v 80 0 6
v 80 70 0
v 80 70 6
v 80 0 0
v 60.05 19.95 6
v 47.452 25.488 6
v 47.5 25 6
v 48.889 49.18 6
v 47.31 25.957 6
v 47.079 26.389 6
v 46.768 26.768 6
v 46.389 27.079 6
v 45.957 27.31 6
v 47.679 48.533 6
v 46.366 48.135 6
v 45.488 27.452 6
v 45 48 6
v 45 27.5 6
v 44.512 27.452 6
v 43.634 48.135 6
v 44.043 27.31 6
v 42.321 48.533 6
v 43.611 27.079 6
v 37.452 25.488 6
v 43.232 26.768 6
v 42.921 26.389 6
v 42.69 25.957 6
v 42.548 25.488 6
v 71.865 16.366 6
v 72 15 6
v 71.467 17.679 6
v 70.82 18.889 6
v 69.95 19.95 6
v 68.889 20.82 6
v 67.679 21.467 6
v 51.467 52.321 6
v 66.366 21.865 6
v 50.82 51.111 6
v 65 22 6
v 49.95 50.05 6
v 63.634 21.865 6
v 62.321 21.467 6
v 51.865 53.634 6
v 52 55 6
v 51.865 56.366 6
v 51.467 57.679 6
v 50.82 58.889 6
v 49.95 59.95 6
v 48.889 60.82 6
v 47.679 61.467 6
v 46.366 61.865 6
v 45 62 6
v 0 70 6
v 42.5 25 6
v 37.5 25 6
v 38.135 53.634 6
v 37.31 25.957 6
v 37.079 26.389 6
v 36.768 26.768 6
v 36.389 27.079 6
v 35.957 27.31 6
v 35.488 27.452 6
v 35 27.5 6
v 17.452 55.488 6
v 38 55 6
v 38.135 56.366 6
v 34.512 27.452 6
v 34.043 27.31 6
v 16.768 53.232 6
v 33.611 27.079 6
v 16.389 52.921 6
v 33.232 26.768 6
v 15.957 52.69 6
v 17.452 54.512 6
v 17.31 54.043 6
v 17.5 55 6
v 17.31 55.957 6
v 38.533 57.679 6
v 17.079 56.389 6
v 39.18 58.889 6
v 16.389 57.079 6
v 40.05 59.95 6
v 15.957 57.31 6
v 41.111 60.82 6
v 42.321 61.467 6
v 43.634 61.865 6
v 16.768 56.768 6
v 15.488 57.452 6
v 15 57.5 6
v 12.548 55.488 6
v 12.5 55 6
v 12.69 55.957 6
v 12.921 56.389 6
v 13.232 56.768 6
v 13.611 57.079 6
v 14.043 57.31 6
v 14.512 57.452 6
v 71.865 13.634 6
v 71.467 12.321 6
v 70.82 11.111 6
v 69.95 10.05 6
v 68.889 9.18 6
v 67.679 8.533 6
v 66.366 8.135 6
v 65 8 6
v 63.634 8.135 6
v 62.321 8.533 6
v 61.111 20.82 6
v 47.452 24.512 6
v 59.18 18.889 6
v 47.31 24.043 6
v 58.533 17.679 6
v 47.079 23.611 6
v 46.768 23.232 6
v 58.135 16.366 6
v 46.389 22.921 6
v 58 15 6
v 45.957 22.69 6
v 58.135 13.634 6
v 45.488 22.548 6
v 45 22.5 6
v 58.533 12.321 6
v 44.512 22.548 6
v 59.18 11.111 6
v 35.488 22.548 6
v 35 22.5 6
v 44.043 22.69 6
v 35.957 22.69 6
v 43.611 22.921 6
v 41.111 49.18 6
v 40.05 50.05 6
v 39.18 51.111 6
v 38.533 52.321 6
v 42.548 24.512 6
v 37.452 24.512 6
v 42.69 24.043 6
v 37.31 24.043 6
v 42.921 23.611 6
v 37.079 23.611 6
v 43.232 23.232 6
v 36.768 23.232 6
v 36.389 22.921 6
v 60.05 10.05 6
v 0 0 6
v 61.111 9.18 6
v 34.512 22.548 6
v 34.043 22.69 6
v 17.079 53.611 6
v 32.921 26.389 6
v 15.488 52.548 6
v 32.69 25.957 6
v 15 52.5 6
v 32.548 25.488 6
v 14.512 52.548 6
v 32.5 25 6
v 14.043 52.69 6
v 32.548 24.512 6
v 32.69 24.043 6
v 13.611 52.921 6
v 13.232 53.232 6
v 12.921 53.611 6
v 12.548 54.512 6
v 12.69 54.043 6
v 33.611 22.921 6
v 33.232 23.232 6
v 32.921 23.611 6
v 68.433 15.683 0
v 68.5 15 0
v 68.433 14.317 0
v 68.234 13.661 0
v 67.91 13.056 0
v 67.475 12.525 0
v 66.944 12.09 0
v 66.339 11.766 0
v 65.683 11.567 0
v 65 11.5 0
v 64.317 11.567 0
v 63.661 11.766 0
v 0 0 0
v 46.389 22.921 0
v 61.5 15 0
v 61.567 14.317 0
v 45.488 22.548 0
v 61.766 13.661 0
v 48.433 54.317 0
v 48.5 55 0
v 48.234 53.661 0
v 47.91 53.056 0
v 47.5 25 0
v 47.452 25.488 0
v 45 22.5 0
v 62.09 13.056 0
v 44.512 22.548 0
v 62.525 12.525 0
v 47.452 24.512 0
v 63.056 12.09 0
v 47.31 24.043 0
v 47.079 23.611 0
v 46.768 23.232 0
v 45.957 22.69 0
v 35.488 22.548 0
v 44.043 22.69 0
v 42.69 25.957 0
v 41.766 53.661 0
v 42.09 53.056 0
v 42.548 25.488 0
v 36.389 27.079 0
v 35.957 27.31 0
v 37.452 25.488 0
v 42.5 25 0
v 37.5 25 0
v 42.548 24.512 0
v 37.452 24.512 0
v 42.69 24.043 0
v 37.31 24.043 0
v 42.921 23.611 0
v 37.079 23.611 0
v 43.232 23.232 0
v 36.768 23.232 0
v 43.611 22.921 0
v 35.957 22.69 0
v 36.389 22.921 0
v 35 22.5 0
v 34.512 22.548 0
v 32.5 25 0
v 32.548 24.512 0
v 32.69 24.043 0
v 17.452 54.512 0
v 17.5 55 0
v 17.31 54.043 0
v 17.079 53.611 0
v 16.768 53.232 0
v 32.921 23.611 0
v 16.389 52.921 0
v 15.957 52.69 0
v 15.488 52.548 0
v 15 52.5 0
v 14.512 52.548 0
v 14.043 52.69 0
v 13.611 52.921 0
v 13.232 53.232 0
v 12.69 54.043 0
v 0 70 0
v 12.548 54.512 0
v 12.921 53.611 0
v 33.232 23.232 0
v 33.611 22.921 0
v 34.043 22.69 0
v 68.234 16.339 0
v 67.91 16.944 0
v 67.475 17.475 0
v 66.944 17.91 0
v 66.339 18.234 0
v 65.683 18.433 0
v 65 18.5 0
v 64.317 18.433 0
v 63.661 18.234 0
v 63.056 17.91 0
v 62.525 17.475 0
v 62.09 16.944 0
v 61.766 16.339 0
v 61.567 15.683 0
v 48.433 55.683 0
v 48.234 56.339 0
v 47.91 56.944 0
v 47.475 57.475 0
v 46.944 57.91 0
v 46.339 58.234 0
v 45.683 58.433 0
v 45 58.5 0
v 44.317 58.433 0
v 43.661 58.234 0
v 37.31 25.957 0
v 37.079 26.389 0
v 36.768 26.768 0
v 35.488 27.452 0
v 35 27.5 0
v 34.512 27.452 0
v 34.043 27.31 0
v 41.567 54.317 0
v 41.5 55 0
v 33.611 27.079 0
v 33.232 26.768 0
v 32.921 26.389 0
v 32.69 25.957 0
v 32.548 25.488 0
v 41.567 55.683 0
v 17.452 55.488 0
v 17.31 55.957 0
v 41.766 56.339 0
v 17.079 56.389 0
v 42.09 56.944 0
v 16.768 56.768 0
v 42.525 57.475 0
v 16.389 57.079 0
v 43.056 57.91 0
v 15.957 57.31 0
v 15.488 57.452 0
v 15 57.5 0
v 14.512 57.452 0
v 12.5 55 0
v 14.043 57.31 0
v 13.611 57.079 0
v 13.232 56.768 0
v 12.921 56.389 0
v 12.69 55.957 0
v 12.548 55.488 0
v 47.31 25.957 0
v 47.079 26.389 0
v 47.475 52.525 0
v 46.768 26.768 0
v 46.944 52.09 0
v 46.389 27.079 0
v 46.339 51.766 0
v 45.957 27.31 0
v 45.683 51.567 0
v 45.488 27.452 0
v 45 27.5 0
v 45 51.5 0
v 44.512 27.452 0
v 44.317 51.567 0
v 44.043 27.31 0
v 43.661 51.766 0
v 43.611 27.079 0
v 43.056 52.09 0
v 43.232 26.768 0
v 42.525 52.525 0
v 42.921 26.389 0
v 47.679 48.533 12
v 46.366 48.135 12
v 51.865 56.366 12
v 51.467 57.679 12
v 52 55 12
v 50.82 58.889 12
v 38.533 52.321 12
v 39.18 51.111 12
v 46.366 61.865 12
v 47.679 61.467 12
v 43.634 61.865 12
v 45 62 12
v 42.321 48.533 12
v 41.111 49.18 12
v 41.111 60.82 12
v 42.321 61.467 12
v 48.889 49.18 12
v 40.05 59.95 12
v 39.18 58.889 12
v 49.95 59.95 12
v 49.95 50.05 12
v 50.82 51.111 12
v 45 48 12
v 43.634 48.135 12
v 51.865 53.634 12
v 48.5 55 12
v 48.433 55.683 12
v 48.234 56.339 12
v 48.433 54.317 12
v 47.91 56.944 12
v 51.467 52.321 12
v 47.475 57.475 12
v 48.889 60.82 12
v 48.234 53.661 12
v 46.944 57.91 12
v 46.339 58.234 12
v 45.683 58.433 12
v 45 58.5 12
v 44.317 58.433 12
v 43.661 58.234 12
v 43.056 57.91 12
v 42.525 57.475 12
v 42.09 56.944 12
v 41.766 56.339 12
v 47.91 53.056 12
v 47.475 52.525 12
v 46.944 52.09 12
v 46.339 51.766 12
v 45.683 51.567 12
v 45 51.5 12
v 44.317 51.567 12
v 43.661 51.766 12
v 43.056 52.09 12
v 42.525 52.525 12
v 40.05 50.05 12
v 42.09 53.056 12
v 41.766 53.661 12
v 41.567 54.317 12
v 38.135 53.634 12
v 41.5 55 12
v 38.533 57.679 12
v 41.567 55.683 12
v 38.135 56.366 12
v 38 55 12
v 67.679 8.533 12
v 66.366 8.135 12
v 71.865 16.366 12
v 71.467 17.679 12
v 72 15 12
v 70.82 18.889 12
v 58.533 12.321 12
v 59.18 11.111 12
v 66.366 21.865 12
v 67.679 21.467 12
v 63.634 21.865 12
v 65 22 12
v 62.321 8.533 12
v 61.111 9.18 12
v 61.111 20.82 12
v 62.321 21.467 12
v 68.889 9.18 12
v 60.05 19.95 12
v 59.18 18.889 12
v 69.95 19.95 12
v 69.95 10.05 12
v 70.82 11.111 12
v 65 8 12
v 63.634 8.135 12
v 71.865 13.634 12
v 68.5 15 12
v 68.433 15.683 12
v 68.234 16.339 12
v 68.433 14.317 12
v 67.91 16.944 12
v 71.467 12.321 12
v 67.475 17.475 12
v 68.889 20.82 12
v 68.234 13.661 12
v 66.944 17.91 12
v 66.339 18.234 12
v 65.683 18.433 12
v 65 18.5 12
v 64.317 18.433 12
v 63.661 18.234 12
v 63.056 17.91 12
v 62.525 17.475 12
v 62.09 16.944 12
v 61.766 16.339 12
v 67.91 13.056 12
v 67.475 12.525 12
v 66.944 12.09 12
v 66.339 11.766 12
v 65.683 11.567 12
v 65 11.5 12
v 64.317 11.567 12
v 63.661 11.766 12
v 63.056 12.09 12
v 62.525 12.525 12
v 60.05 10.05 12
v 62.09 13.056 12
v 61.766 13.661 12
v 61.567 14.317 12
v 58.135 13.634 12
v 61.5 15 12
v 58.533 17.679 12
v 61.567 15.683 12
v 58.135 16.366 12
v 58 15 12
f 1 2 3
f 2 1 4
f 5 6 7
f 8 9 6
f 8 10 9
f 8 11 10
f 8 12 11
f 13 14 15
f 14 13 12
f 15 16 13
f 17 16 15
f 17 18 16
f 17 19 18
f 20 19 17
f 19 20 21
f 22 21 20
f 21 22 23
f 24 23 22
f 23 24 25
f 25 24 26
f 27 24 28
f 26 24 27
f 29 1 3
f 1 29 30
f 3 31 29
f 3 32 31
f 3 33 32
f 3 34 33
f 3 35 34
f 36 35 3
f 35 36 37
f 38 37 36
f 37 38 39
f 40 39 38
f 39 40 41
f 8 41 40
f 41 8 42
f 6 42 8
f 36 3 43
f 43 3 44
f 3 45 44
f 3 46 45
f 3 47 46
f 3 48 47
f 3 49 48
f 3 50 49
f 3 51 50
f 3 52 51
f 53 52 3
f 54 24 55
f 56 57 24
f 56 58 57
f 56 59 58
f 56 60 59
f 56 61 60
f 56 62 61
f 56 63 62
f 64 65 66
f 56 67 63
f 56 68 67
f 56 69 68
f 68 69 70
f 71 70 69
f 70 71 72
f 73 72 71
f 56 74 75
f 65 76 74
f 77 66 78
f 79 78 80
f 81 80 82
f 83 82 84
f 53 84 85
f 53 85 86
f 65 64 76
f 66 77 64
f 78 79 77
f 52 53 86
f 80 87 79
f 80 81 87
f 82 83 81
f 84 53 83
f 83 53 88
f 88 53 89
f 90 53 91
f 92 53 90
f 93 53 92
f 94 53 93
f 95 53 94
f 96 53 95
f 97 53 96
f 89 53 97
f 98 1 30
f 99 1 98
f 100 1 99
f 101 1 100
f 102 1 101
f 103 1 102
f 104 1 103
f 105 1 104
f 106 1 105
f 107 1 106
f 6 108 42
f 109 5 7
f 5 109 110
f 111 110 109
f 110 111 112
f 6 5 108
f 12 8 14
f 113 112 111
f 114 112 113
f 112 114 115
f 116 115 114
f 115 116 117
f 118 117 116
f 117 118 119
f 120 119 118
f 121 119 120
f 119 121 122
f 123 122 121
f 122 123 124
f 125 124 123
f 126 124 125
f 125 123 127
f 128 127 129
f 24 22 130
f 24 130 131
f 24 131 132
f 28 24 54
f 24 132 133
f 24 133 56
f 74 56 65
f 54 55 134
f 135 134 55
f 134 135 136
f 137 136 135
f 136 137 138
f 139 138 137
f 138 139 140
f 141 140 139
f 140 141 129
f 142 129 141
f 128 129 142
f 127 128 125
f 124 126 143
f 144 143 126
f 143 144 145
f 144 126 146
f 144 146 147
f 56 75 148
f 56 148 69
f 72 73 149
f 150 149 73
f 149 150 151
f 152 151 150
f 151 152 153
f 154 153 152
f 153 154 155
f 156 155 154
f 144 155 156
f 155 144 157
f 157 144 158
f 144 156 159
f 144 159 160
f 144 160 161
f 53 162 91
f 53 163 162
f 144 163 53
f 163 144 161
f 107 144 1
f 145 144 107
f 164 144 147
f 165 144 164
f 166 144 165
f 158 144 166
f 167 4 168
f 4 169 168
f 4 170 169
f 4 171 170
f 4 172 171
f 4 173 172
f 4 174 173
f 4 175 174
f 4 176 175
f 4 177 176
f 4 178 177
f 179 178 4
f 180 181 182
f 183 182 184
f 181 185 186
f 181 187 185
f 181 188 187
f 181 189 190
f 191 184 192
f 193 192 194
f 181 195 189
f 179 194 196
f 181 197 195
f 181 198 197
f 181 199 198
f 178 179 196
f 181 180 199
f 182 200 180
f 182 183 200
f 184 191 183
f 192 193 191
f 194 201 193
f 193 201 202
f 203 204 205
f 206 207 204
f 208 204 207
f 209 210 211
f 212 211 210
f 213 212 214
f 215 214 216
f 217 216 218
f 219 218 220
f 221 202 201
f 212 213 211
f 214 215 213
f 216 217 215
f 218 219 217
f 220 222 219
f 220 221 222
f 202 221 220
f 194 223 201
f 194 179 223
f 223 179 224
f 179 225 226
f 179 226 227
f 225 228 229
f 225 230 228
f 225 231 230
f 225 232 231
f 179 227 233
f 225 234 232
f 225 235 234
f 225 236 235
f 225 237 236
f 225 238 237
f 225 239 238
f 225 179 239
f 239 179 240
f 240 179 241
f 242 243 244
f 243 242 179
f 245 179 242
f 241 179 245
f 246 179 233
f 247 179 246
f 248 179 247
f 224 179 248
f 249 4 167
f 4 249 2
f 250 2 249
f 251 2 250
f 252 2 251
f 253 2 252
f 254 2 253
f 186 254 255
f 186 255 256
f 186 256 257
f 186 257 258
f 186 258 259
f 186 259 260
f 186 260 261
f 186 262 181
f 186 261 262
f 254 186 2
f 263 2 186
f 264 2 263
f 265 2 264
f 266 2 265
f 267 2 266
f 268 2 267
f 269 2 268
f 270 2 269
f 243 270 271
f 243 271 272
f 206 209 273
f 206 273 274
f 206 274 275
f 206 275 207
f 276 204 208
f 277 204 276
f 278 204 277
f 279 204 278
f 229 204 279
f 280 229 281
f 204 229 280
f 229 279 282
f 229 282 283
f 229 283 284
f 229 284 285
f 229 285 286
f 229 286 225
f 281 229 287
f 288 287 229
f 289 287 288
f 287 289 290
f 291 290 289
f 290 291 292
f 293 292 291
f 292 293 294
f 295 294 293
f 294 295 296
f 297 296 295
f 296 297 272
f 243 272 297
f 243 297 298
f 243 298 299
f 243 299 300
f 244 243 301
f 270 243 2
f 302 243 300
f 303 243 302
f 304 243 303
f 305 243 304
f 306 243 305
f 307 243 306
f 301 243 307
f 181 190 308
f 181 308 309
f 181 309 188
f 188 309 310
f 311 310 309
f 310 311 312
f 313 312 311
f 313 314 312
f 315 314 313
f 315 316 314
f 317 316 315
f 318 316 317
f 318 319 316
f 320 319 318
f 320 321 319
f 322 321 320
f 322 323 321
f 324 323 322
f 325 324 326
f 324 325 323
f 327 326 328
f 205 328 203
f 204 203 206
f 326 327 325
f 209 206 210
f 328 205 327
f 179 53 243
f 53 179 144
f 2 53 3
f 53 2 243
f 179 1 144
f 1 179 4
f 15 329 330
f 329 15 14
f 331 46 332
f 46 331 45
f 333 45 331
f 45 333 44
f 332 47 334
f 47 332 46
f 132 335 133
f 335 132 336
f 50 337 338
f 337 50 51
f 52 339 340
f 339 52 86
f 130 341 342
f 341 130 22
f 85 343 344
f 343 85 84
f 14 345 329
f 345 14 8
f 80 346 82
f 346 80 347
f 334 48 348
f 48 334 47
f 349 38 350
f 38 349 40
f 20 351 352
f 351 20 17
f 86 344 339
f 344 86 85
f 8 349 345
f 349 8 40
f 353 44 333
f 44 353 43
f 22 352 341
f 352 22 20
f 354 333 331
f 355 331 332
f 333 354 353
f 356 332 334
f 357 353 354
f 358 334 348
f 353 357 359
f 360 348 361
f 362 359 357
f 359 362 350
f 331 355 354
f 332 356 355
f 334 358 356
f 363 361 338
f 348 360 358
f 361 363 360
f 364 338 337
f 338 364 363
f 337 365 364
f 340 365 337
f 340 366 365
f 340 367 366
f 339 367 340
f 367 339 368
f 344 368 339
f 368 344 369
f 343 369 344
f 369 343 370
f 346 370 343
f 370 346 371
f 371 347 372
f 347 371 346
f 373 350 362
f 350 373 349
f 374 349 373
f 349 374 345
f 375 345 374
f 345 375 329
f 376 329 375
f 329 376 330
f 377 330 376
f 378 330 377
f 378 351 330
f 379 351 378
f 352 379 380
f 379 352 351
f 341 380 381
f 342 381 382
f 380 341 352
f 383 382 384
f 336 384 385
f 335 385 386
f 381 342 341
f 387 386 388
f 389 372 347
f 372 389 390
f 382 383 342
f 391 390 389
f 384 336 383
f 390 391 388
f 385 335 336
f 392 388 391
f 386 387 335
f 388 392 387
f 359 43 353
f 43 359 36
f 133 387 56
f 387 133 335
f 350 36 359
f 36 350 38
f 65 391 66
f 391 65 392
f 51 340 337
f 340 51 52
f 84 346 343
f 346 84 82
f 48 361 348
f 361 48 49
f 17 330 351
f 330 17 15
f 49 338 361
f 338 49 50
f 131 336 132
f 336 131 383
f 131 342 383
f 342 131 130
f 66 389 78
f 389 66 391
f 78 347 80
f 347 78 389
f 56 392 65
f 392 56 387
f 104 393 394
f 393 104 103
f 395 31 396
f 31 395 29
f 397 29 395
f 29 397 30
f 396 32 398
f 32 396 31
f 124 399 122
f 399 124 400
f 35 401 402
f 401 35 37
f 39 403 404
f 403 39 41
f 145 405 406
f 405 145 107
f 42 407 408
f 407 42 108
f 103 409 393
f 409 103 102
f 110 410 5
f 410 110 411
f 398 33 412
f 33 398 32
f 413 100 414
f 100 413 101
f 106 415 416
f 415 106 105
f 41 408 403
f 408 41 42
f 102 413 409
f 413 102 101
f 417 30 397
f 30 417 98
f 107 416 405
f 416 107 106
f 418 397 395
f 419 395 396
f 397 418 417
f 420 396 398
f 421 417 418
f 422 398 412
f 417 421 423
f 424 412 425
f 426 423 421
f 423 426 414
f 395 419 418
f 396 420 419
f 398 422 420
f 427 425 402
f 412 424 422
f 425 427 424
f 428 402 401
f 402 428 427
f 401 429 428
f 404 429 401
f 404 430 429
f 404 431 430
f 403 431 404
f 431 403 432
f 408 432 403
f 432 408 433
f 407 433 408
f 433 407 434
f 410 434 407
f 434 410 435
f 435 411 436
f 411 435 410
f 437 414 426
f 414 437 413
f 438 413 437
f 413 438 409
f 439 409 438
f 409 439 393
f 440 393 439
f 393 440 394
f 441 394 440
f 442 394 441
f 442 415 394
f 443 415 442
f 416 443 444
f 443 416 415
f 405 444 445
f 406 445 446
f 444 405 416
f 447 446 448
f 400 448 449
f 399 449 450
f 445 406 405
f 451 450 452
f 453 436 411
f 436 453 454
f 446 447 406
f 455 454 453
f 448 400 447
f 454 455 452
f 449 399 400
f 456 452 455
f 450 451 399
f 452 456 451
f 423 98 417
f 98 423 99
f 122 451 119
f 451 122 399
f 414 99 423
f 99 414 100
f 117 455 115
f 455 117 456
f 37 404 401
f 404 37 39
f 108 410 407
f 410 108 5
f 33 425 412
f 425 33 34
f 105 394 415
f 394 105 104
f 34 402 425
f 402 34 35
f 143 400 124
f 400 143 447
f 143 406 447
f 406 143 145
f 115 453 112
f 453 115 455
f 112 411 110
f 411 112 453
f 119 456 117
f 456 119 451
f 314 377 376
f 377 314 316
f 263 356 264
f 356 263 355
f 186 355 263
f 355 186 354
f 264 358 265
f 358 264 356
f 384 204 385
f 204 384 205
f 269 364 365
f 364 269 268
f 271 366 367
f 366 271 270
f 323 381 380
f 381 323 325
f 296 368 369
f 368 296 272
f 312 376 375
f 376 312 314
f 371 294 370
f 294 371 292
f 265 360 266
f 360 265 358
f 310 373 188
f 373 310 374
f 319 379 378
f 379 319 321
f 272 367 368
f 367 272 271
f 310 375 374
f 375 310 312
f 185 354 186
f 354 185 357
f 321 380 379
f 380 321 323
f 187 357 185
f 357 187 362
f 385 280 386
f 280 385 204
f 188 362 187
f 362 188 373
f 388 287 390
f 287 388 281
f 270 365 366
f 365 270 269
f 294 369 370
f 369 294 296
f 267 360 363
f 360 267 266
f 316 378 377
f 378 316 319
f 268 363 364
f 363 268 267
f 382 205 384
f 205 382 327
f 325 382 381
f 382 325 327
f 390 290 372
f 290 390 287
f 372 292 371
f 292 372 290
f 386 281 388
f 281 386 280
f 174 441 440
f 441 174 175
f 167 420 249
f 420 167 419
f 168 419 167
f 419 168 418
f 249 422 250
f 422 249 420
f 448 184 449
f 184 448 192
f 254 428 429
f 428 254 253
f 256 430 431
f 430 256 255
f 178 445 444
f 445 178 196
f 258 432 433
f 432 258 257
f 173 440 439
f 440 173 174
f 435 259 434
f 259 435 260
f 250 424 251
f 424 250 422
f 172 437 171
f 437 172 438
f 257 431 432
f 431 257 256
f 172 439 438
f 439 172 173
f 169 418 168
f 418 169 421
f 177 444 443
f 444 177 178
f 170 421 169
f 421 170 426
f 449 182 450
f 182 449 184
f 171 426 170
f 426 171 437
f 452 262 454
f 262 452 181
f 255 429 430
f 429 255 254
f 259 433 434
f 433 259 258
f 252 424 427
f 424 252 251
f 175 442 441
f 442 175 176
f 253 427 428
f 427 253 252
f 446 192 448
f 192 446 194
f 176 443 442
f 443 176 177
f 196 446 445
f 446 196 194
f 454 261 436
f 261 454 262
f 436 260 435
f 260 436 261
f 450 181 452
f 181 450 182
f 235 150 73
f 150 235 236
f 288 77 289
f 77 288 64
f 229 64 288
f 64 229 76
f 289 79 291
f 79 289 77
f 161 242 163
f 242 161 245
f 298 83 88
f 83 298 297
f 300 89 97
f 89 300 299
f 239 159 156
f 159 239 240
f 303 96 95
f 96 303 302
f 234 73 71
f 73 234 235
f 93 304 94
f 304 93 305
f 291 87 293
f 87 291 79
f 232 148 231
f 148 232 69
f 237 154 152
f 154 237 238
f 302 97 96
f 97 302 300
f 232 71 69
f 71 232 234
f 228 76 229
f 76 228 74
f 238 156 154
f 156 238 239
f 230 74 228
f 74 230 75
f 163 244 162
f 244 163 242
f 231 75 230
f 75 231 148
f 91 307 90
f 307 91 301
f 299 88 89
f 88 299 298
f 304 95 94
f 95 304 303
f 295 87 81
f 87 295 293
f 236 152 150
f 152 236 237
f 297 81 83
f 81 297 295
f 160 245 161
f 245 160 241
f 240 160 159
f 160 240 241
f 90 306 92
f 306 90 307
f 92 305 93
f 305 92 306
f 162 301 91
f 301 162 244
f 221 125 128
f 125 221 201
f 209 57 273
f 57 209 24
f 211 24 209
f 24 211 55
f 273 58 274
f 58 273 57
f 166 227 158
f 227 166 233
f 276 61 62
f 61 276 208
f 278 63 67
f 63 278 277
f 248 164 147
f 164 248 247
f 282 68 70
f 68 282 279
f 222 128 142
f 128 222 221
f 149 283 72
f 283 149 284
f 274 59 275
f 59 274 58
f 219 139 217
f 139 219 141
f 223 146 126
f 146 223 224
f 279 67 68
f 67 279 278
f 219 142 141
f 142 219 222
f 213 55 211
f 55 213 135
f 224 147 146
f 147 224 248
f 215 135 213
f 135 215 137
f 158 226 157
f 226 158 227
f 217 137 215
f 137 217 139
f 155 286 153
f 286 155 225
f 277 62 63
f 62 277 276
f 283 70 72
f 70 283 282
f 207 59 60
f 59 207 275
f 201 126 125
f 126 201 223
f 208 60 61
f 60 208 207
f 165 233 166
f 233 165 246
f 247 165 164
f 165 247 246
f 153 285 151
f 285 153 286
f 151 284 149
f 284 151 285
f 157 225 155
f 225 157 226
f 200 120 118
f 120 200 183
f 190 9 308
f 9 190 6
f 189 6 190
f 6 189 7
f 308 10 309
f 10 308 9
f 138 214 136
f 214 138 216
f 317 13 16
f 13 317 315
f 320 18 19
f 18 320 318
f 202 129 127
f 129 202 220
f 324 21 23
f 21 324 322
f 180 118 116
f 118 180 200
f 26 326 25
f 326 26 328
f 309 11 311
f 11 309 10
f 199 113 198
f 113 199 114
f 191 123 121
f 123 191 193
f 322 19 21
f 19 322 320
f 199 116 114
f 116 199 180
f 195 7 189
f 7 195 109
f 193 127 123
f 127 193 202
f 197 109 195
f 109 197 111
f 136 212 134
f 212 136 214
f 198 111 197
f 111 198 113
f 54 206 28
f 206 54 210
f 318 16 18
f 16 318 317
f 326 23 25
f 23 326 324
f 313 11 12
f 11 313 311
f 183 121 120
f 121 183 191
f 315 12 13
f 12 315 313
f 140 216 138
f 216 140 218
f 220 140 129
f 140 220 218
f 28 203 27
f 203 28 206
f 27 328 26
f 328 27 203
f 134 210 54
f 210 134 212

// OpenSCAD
$fn = 32;

// ----------------------------------------------------------------------
// Mixed field: bosses and holes at given coordinates
// ----------------------------------------------------------------------

// --- parameters (mm) ---
plate_l = 80;             // plate length, X
plate_w = 70;             // plate width, Y
plate_t = 6;              // plate thickness, Z
boss_d = 14;              // boss diameter
boss_h = 6;               // boss height above the plate
hole_d = 5;               // through hole diameter

total_h = plate_t + boss_h;  // overall height

difference() {
  union() {
    cube([plate_l, plate_w, plate_t]);
    translate([45, 55, plate_t]) cylinder(h = boss_h, d = boss_d);
    translate([65, 15, plate_t]) cylinder(h = boss_h, d = boss_d);
  }
  translate([45, 55, -1]) cylinder(h = total_h + 2, d = boss_d / 2);
  translate([65, 15, -1]) cylinder(h = total_h + 2, d = boss_d / 2);
  translate([15, 55, -1]) cylinder(h = plate_t + 2, d = hole_d);
  translate([35, 25, -1]) cylinder(h = plate_t + 2, d = hole_d);
  translate([45, 25, -1]) cylinder(h = plate_t + 2, d = hole_d);
}
